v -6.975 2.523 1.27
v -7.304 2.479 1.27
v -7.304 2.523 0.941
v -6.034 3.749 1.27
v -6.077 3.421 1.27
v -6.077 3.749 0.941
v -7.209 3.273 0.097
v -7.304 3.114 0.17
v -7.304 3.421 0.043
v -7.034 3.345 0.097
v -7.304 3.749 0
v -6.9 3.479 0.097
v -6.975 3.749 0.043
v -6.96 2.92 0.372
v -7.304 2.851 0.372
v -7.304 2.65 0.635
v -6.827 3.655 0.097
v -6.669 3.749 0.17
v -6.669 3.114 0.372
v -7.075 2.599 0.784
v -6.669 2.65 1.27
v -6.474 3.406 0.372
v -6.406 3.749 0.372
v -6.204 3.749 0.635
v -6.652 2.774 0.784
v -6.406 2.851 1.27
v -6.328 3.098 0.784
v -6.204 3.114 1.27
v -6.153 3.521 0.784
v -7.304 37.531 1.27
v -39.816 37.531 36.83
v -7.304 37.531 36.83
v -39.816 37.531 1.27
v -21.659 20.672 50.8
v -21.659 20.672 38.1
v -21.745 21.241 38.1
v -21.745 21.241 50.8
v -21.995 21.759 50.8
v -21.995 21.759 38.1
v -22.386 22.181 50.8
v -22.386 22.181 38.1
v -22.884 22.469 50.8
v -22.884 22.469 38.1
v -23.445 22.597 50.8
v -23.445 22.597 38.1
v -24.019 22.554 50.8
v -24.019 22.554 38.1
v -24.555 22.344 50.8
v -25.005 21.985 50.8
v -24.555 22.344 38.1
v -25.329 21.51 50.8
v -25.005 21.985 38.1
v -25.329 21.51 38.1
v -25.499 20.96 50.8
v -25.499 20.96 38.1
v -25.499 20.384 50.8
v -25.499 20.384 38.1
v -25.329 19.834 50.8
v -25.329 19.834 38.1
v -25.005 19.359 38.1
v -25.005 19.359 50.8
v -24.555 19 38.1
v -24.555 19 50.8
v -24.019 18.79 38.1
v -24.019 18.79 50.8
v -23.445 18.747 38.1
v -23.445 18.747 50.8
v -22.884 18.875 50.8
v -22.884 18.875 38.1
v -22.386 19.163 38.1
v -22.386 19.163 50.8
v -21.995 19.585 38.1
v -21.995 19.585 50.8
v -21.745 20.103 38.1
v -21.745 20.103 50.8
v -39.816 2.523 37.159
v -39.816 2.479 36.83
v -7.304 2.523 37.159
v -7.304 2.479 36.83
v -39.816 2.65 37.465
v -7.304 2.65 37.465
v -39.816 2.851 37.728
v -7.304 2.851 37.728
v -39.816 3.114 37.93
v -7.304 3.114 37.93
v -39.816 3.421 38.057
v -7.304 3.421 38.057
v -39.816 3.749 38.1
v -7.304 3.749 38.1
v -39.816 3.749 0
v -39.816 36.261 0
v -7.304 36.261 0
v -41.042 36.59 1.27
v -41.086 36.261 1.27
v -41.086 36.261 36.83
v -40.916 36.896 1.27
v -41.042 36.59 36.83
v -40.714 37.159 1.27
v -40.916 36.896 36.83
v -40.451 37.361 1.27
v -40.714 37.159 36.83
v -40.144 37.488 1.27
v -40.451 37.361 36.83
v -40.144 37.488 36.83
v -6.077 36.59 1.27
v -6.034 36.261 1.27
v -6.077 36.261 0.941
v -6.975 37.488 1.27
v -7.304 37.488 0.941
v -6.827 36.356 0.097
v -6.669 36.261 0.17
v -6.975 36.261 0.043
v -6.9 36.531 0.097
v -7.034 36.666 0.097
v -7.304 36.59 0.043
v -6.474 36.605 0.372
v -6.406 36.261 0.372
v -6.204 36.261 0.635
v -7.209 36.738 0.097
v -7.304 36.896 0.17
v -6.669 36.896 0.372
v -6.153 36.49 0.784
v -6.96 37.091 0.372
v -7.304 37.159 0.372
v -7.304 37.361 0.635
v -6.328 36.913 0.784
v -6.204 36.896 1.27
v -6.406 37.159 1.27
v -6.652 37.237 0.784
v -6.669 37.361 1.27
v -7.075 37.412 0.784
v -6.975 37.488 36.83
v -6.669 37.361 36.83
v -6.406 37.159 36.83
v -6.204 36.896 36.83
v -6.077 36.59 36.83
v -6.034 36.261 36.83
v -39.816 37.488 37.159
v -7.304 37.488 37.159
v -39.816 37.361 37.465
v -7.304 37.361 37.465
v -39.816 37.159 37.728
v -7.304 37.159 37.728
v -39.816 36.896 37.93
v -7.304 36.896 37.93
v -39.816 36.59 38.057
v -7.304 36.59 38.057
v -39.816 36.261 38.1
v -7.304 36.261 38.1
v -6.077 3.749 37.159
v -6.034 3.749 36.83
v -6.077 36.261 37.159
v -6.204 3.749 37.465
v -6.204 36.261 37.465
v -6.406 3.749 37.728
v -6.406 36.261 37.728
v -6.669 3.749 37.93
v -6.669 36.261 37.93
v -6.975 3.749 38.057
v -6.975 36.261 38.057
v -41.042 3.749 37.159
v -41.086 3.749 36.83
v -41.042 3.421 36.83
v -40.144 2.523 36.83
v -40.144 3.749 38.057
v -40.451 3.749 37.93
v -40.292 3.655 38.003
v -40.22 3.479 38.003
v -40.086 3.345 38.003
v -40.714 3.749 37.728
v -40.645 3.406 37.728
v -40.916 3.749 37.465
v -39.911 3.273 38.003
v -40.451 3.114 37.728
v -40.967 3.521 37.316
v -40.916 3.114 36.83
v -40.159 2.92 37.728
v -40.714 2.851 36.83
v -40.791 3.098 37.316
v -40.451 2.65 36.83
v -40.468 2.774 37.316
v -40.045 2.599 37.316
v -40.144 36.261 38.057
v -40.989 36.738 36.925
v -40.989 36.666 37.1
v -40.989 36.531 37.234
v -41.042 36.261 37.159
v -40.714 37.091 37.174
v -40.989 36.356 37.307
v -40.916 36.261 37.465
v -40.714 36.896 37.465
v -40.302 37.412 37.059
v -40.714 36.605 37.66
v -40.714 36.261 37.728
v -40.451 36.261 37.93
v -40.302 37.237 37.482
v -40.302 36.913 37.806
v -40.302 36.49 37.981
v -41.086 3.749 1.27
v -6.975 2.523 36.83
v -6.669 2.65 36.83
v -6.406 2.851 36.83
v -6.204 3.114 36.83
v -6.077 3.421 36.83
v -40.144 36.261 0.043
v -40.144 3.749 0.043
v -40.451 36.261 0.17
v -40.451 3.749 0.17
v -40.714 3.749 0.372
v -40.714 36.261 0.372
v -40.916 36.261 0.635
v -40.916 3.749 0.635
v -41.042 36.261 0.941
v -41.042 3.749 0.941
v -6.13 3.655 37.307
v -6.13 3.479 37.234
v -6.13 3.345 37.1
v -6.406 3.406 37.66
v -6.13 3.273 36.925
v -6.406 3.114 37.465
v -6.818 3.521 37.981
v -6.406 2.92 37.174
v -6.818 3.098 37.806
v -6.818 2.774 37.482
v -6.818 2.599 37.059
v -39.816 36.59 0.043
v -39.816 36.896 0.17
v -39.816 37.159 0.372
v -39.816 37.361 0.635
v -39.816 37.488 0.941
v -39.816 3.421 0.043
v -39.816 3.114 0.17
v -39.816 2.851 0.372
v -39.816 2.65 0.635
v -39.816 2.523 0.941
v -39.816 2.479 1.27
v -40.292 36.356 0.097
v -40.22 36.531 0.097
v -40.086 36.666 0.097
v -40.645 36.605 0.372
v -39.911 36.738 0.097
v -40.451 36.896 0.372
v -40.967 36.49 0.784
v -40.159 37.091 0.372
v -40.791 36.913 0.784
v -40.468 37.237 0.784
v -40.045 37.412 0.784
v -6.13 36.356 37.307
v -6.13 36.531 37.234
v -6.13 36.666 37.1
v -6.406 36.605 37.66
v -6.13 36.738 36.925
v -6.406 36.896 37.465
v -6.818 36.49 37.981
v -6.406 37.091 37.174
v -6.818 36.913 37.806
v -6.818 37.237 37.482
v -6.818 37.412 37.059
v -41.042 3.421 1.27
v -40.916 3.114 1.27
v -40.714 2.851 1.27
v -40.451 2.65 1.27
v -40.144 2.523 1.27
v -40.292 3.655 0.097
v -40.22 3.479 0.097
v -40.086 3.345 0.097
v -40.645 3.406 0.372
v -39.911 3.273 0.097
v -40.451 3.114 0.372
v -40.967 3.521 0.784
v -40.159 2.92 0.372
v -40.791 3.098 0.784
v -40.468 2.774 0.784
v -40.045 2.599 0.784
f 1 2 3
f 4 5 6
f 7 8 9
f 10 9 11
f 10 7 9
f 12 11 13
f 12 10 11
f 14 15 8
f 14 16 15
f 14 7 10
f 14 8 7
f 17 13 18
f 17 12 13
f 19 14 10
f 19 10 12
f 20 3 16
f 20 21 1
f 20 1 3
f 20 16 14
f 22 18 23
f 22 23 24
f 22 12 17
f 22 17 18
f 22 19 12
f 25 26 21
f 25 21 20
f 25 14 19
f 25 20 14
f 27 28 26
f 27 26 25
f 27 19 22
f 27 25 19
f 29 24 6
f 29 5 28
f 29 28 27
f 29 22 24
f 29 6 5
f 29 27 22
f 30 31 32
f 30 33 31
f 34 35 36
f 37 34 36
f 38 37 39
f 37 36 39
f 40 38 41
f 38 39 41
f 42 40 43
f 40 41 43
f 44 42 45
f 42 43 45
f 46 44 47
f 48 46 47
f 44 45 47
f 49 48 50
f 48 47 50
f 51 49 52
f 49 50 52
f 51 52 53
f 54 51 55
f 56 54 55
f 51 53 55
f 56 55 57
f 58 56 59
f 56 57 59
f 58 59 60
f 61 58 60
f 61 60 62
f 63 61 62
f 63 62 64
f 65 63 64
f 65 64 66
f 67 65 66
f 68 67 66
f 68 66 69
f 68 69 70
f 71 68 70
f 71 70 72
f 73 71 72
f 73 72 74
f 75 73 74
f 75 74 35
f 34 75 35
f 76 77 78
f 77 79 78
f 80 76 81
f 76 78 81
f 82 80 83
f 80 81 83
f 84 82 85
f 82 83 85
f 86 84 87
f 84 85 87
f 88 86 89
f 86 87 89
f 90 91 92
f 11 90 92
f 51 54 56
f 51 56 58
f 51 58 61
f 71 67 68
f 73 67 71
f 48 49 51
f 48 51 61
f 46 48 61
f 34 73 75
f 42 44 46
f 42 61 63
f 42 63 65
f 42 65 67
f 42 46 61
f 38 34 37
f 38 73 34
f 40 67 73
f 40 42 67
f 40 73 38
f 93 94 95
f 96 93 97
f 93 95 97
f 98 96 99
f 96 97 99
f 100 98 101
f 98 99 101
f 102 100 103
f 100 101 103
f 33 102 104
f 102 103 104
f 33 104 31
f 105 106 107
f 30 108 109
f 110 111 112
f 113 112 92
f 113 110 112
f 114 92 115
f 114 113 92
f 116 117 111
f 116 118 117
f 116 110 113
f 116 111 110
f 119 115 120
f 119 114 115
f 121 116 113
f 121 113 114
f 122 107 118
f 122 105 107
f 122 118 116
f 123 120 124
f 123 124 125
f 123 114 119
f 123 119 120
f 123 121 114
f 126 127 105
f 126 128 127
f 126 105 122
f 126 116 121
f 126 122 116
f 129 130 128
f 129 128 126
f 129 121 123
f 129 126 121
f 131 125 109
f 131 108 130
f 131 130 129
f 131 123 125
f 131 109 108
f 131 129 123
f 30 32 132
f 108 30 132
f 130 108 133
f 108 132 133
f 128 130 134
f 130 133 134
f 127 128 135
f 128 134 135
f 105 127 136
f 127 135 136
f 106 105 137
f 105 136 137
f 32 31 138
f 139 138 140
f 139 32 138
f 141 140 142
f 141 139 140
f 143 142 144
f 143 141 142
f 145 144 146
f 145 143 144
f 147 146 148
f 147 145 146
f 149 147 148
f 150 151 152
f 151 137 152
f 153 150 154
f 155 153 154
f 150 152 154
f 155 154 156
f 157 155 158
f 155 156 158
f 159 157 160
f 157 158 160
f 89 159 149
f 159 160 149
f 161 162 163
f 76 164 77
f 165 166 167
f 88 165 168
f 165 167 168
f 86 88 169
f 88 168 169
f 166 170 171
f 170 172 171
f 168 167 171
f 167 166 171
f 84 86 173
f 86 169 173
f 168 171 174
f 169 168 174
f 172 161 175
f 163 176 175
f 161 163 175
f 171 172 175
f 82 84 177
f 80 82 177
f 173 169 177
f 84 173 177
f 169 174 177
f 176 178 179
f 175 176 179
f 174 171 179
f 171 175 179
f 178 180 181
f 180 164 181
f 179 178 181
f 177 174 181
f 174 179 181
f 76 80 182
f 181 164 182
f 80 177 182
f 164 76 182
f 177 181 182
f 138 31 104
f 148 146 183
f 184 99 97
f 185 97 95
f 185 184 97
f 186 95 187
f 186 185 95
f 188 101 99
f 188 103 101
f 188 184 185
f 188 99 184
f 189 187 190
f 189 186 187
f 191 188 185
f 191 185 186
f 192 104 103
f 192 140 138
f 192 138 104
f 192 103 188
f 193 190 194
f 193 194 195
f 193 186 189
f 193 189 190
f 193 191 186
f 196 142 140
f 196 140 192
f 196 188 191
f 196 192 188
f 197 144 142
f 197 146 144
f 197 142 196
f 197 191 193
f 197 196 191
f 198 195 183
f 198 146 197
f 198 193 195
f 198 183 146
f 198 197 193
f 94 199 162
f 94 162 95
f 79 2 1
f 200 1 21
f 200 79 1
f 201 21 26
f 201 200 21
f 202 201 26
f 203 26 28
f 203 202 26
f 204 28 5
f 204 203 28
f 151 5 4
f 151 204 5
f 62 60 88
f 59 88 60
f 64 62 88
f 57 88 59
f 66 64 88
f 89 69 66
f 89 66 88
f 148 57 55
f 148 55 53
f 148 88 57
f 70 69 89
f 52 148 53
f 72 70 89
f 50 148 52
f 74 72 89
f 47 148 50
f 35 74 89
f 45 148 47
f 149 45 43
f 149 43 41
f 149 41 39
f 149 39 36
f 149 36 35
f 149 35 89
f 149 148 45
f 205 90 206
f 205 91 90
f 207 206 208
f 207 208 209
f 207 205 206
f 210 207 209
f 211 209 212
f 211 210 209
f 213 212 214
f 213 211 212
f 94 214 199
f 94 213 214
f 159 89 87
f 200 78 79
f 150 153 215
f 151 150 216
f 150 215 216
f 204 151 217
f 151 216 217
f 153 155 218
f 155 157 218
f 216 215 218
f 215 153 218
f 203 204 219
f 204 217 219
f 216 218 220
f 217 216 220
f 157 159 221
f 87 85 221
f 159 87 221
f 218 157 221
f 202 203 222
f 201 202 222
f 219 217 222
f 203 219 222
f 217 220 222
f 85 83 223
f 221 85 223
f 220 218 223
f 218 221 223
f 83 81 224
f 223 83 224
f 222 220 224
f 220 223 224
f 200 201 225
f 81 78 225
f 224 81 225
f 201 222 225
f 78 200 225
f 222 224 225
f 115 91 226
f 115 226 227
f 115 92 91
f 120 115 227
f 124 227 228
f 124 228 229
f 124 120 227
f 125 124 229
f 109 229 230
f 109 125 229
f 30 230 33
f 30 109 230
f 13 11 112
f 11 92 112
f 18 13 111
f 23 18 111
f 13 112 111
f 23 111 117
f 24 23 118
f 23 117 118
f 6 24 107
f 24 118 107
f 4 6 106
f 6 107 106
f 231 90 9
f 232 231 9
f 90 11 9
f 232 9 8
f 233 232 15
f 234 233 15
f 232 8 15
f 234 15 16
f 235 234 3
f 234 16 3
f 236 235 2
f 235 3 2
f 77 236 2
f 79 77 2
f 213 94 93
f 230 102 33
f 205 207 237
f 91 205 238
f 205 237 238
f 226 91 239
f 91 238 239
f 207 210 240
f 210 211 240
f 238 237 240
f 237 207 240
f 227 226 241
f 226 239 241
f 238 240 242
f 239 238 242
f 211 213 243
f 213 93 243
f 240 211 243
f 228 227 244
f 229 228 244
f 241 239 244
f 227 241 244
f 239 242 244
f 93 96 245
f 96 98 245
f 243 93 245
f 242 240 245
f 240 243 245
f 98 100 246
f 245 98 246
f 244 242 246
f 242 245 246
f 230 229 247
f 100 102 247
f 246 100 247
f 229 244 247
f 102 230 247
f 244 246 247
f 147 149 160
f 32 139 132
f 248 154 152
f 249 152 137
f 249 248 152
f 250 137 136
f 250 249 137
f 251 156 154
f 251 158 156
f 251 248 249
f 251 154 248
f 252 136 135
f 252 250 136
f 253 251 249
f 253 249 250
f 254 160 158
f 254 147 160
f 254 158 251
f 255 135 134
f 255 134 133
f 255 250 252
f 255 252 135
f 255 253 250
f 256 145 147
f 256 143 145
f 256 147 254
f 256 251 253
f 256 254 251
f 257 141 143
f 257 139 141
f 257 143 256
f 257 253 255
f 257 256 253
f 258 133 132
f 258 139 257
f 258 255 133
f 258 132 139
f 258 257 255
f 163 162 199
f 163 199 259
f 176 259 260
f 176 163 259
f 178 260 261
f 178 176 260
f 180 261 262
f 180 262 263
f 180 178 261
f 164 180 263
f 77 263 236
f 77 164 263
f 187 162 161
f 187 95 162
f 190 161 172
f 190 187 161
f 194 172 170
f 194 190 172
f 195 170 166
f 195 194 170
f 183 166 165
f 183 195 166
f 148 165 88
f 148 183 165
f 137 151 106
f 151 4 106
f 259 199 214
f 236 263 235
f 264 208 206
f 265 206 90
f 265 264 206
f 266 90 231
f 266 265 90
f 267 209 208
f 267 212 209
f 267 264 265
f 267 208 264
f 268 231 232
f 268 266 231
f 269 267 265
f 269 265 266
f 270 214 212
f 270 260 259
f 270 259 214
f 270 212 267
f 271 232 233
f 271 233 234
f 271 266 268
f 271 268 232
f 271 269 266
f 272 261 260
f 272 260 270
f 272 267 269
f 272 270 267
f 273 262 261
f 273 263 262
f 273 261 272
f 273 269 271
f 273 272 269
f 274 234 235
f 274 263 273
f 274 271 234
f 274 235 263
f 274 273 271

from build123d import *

# Parameters (mm, degrees)
F0_W     = 35.052
F0_H     = 35.052
F1_DEPTH = 38.1
F2_R     = 1.9304
F3_DEPTH = 50.8
F4_R     = 1.27


with BuildPart() as f1:
    # F0 (on Top) → F1 (new body)
    with BuildSketch(Plane.XY):
        with Locations((-23.559753, 20.005452)):
            Rectangle(F0_W, F0_H)
    extrude(amount=F1_DEPTH)

    # F2 (on Top) → F3 (join)
    with BuildSketch(Plane.XY):
        with Locations((-23.589674, 20.671986)):
            Circle(F2_R)
    extrude(amount=F3_DEPTH)

    # F4
    f4_edges = [f1.edges().sort_by_distance(p)[0] for p in [
        (-23.559753, 37.531452, 38.1),
        (-41.085753, 37.531452, 19.05),
        (-41.085753, 2.479452, 19.05),
        (-41.085753, 20.005452, 0),
        (-41.085753, 20.005452, 38.1),
        (-23.559753, 2.479452, 38.1),
        (-6.033753, 20.005452, 38.1),
        (-6.033753, 2.479452, 19.05),
        (-23.559753, 2.479452, 0),
        (-6.033753, 37.531452, 19.05),
        (-6.033753, 20.005452, 0),
        (-23.559753, 37.531452, 0),
    ]]
    fillet(f4_edges, radius=F4_R)


solid = f1.part
